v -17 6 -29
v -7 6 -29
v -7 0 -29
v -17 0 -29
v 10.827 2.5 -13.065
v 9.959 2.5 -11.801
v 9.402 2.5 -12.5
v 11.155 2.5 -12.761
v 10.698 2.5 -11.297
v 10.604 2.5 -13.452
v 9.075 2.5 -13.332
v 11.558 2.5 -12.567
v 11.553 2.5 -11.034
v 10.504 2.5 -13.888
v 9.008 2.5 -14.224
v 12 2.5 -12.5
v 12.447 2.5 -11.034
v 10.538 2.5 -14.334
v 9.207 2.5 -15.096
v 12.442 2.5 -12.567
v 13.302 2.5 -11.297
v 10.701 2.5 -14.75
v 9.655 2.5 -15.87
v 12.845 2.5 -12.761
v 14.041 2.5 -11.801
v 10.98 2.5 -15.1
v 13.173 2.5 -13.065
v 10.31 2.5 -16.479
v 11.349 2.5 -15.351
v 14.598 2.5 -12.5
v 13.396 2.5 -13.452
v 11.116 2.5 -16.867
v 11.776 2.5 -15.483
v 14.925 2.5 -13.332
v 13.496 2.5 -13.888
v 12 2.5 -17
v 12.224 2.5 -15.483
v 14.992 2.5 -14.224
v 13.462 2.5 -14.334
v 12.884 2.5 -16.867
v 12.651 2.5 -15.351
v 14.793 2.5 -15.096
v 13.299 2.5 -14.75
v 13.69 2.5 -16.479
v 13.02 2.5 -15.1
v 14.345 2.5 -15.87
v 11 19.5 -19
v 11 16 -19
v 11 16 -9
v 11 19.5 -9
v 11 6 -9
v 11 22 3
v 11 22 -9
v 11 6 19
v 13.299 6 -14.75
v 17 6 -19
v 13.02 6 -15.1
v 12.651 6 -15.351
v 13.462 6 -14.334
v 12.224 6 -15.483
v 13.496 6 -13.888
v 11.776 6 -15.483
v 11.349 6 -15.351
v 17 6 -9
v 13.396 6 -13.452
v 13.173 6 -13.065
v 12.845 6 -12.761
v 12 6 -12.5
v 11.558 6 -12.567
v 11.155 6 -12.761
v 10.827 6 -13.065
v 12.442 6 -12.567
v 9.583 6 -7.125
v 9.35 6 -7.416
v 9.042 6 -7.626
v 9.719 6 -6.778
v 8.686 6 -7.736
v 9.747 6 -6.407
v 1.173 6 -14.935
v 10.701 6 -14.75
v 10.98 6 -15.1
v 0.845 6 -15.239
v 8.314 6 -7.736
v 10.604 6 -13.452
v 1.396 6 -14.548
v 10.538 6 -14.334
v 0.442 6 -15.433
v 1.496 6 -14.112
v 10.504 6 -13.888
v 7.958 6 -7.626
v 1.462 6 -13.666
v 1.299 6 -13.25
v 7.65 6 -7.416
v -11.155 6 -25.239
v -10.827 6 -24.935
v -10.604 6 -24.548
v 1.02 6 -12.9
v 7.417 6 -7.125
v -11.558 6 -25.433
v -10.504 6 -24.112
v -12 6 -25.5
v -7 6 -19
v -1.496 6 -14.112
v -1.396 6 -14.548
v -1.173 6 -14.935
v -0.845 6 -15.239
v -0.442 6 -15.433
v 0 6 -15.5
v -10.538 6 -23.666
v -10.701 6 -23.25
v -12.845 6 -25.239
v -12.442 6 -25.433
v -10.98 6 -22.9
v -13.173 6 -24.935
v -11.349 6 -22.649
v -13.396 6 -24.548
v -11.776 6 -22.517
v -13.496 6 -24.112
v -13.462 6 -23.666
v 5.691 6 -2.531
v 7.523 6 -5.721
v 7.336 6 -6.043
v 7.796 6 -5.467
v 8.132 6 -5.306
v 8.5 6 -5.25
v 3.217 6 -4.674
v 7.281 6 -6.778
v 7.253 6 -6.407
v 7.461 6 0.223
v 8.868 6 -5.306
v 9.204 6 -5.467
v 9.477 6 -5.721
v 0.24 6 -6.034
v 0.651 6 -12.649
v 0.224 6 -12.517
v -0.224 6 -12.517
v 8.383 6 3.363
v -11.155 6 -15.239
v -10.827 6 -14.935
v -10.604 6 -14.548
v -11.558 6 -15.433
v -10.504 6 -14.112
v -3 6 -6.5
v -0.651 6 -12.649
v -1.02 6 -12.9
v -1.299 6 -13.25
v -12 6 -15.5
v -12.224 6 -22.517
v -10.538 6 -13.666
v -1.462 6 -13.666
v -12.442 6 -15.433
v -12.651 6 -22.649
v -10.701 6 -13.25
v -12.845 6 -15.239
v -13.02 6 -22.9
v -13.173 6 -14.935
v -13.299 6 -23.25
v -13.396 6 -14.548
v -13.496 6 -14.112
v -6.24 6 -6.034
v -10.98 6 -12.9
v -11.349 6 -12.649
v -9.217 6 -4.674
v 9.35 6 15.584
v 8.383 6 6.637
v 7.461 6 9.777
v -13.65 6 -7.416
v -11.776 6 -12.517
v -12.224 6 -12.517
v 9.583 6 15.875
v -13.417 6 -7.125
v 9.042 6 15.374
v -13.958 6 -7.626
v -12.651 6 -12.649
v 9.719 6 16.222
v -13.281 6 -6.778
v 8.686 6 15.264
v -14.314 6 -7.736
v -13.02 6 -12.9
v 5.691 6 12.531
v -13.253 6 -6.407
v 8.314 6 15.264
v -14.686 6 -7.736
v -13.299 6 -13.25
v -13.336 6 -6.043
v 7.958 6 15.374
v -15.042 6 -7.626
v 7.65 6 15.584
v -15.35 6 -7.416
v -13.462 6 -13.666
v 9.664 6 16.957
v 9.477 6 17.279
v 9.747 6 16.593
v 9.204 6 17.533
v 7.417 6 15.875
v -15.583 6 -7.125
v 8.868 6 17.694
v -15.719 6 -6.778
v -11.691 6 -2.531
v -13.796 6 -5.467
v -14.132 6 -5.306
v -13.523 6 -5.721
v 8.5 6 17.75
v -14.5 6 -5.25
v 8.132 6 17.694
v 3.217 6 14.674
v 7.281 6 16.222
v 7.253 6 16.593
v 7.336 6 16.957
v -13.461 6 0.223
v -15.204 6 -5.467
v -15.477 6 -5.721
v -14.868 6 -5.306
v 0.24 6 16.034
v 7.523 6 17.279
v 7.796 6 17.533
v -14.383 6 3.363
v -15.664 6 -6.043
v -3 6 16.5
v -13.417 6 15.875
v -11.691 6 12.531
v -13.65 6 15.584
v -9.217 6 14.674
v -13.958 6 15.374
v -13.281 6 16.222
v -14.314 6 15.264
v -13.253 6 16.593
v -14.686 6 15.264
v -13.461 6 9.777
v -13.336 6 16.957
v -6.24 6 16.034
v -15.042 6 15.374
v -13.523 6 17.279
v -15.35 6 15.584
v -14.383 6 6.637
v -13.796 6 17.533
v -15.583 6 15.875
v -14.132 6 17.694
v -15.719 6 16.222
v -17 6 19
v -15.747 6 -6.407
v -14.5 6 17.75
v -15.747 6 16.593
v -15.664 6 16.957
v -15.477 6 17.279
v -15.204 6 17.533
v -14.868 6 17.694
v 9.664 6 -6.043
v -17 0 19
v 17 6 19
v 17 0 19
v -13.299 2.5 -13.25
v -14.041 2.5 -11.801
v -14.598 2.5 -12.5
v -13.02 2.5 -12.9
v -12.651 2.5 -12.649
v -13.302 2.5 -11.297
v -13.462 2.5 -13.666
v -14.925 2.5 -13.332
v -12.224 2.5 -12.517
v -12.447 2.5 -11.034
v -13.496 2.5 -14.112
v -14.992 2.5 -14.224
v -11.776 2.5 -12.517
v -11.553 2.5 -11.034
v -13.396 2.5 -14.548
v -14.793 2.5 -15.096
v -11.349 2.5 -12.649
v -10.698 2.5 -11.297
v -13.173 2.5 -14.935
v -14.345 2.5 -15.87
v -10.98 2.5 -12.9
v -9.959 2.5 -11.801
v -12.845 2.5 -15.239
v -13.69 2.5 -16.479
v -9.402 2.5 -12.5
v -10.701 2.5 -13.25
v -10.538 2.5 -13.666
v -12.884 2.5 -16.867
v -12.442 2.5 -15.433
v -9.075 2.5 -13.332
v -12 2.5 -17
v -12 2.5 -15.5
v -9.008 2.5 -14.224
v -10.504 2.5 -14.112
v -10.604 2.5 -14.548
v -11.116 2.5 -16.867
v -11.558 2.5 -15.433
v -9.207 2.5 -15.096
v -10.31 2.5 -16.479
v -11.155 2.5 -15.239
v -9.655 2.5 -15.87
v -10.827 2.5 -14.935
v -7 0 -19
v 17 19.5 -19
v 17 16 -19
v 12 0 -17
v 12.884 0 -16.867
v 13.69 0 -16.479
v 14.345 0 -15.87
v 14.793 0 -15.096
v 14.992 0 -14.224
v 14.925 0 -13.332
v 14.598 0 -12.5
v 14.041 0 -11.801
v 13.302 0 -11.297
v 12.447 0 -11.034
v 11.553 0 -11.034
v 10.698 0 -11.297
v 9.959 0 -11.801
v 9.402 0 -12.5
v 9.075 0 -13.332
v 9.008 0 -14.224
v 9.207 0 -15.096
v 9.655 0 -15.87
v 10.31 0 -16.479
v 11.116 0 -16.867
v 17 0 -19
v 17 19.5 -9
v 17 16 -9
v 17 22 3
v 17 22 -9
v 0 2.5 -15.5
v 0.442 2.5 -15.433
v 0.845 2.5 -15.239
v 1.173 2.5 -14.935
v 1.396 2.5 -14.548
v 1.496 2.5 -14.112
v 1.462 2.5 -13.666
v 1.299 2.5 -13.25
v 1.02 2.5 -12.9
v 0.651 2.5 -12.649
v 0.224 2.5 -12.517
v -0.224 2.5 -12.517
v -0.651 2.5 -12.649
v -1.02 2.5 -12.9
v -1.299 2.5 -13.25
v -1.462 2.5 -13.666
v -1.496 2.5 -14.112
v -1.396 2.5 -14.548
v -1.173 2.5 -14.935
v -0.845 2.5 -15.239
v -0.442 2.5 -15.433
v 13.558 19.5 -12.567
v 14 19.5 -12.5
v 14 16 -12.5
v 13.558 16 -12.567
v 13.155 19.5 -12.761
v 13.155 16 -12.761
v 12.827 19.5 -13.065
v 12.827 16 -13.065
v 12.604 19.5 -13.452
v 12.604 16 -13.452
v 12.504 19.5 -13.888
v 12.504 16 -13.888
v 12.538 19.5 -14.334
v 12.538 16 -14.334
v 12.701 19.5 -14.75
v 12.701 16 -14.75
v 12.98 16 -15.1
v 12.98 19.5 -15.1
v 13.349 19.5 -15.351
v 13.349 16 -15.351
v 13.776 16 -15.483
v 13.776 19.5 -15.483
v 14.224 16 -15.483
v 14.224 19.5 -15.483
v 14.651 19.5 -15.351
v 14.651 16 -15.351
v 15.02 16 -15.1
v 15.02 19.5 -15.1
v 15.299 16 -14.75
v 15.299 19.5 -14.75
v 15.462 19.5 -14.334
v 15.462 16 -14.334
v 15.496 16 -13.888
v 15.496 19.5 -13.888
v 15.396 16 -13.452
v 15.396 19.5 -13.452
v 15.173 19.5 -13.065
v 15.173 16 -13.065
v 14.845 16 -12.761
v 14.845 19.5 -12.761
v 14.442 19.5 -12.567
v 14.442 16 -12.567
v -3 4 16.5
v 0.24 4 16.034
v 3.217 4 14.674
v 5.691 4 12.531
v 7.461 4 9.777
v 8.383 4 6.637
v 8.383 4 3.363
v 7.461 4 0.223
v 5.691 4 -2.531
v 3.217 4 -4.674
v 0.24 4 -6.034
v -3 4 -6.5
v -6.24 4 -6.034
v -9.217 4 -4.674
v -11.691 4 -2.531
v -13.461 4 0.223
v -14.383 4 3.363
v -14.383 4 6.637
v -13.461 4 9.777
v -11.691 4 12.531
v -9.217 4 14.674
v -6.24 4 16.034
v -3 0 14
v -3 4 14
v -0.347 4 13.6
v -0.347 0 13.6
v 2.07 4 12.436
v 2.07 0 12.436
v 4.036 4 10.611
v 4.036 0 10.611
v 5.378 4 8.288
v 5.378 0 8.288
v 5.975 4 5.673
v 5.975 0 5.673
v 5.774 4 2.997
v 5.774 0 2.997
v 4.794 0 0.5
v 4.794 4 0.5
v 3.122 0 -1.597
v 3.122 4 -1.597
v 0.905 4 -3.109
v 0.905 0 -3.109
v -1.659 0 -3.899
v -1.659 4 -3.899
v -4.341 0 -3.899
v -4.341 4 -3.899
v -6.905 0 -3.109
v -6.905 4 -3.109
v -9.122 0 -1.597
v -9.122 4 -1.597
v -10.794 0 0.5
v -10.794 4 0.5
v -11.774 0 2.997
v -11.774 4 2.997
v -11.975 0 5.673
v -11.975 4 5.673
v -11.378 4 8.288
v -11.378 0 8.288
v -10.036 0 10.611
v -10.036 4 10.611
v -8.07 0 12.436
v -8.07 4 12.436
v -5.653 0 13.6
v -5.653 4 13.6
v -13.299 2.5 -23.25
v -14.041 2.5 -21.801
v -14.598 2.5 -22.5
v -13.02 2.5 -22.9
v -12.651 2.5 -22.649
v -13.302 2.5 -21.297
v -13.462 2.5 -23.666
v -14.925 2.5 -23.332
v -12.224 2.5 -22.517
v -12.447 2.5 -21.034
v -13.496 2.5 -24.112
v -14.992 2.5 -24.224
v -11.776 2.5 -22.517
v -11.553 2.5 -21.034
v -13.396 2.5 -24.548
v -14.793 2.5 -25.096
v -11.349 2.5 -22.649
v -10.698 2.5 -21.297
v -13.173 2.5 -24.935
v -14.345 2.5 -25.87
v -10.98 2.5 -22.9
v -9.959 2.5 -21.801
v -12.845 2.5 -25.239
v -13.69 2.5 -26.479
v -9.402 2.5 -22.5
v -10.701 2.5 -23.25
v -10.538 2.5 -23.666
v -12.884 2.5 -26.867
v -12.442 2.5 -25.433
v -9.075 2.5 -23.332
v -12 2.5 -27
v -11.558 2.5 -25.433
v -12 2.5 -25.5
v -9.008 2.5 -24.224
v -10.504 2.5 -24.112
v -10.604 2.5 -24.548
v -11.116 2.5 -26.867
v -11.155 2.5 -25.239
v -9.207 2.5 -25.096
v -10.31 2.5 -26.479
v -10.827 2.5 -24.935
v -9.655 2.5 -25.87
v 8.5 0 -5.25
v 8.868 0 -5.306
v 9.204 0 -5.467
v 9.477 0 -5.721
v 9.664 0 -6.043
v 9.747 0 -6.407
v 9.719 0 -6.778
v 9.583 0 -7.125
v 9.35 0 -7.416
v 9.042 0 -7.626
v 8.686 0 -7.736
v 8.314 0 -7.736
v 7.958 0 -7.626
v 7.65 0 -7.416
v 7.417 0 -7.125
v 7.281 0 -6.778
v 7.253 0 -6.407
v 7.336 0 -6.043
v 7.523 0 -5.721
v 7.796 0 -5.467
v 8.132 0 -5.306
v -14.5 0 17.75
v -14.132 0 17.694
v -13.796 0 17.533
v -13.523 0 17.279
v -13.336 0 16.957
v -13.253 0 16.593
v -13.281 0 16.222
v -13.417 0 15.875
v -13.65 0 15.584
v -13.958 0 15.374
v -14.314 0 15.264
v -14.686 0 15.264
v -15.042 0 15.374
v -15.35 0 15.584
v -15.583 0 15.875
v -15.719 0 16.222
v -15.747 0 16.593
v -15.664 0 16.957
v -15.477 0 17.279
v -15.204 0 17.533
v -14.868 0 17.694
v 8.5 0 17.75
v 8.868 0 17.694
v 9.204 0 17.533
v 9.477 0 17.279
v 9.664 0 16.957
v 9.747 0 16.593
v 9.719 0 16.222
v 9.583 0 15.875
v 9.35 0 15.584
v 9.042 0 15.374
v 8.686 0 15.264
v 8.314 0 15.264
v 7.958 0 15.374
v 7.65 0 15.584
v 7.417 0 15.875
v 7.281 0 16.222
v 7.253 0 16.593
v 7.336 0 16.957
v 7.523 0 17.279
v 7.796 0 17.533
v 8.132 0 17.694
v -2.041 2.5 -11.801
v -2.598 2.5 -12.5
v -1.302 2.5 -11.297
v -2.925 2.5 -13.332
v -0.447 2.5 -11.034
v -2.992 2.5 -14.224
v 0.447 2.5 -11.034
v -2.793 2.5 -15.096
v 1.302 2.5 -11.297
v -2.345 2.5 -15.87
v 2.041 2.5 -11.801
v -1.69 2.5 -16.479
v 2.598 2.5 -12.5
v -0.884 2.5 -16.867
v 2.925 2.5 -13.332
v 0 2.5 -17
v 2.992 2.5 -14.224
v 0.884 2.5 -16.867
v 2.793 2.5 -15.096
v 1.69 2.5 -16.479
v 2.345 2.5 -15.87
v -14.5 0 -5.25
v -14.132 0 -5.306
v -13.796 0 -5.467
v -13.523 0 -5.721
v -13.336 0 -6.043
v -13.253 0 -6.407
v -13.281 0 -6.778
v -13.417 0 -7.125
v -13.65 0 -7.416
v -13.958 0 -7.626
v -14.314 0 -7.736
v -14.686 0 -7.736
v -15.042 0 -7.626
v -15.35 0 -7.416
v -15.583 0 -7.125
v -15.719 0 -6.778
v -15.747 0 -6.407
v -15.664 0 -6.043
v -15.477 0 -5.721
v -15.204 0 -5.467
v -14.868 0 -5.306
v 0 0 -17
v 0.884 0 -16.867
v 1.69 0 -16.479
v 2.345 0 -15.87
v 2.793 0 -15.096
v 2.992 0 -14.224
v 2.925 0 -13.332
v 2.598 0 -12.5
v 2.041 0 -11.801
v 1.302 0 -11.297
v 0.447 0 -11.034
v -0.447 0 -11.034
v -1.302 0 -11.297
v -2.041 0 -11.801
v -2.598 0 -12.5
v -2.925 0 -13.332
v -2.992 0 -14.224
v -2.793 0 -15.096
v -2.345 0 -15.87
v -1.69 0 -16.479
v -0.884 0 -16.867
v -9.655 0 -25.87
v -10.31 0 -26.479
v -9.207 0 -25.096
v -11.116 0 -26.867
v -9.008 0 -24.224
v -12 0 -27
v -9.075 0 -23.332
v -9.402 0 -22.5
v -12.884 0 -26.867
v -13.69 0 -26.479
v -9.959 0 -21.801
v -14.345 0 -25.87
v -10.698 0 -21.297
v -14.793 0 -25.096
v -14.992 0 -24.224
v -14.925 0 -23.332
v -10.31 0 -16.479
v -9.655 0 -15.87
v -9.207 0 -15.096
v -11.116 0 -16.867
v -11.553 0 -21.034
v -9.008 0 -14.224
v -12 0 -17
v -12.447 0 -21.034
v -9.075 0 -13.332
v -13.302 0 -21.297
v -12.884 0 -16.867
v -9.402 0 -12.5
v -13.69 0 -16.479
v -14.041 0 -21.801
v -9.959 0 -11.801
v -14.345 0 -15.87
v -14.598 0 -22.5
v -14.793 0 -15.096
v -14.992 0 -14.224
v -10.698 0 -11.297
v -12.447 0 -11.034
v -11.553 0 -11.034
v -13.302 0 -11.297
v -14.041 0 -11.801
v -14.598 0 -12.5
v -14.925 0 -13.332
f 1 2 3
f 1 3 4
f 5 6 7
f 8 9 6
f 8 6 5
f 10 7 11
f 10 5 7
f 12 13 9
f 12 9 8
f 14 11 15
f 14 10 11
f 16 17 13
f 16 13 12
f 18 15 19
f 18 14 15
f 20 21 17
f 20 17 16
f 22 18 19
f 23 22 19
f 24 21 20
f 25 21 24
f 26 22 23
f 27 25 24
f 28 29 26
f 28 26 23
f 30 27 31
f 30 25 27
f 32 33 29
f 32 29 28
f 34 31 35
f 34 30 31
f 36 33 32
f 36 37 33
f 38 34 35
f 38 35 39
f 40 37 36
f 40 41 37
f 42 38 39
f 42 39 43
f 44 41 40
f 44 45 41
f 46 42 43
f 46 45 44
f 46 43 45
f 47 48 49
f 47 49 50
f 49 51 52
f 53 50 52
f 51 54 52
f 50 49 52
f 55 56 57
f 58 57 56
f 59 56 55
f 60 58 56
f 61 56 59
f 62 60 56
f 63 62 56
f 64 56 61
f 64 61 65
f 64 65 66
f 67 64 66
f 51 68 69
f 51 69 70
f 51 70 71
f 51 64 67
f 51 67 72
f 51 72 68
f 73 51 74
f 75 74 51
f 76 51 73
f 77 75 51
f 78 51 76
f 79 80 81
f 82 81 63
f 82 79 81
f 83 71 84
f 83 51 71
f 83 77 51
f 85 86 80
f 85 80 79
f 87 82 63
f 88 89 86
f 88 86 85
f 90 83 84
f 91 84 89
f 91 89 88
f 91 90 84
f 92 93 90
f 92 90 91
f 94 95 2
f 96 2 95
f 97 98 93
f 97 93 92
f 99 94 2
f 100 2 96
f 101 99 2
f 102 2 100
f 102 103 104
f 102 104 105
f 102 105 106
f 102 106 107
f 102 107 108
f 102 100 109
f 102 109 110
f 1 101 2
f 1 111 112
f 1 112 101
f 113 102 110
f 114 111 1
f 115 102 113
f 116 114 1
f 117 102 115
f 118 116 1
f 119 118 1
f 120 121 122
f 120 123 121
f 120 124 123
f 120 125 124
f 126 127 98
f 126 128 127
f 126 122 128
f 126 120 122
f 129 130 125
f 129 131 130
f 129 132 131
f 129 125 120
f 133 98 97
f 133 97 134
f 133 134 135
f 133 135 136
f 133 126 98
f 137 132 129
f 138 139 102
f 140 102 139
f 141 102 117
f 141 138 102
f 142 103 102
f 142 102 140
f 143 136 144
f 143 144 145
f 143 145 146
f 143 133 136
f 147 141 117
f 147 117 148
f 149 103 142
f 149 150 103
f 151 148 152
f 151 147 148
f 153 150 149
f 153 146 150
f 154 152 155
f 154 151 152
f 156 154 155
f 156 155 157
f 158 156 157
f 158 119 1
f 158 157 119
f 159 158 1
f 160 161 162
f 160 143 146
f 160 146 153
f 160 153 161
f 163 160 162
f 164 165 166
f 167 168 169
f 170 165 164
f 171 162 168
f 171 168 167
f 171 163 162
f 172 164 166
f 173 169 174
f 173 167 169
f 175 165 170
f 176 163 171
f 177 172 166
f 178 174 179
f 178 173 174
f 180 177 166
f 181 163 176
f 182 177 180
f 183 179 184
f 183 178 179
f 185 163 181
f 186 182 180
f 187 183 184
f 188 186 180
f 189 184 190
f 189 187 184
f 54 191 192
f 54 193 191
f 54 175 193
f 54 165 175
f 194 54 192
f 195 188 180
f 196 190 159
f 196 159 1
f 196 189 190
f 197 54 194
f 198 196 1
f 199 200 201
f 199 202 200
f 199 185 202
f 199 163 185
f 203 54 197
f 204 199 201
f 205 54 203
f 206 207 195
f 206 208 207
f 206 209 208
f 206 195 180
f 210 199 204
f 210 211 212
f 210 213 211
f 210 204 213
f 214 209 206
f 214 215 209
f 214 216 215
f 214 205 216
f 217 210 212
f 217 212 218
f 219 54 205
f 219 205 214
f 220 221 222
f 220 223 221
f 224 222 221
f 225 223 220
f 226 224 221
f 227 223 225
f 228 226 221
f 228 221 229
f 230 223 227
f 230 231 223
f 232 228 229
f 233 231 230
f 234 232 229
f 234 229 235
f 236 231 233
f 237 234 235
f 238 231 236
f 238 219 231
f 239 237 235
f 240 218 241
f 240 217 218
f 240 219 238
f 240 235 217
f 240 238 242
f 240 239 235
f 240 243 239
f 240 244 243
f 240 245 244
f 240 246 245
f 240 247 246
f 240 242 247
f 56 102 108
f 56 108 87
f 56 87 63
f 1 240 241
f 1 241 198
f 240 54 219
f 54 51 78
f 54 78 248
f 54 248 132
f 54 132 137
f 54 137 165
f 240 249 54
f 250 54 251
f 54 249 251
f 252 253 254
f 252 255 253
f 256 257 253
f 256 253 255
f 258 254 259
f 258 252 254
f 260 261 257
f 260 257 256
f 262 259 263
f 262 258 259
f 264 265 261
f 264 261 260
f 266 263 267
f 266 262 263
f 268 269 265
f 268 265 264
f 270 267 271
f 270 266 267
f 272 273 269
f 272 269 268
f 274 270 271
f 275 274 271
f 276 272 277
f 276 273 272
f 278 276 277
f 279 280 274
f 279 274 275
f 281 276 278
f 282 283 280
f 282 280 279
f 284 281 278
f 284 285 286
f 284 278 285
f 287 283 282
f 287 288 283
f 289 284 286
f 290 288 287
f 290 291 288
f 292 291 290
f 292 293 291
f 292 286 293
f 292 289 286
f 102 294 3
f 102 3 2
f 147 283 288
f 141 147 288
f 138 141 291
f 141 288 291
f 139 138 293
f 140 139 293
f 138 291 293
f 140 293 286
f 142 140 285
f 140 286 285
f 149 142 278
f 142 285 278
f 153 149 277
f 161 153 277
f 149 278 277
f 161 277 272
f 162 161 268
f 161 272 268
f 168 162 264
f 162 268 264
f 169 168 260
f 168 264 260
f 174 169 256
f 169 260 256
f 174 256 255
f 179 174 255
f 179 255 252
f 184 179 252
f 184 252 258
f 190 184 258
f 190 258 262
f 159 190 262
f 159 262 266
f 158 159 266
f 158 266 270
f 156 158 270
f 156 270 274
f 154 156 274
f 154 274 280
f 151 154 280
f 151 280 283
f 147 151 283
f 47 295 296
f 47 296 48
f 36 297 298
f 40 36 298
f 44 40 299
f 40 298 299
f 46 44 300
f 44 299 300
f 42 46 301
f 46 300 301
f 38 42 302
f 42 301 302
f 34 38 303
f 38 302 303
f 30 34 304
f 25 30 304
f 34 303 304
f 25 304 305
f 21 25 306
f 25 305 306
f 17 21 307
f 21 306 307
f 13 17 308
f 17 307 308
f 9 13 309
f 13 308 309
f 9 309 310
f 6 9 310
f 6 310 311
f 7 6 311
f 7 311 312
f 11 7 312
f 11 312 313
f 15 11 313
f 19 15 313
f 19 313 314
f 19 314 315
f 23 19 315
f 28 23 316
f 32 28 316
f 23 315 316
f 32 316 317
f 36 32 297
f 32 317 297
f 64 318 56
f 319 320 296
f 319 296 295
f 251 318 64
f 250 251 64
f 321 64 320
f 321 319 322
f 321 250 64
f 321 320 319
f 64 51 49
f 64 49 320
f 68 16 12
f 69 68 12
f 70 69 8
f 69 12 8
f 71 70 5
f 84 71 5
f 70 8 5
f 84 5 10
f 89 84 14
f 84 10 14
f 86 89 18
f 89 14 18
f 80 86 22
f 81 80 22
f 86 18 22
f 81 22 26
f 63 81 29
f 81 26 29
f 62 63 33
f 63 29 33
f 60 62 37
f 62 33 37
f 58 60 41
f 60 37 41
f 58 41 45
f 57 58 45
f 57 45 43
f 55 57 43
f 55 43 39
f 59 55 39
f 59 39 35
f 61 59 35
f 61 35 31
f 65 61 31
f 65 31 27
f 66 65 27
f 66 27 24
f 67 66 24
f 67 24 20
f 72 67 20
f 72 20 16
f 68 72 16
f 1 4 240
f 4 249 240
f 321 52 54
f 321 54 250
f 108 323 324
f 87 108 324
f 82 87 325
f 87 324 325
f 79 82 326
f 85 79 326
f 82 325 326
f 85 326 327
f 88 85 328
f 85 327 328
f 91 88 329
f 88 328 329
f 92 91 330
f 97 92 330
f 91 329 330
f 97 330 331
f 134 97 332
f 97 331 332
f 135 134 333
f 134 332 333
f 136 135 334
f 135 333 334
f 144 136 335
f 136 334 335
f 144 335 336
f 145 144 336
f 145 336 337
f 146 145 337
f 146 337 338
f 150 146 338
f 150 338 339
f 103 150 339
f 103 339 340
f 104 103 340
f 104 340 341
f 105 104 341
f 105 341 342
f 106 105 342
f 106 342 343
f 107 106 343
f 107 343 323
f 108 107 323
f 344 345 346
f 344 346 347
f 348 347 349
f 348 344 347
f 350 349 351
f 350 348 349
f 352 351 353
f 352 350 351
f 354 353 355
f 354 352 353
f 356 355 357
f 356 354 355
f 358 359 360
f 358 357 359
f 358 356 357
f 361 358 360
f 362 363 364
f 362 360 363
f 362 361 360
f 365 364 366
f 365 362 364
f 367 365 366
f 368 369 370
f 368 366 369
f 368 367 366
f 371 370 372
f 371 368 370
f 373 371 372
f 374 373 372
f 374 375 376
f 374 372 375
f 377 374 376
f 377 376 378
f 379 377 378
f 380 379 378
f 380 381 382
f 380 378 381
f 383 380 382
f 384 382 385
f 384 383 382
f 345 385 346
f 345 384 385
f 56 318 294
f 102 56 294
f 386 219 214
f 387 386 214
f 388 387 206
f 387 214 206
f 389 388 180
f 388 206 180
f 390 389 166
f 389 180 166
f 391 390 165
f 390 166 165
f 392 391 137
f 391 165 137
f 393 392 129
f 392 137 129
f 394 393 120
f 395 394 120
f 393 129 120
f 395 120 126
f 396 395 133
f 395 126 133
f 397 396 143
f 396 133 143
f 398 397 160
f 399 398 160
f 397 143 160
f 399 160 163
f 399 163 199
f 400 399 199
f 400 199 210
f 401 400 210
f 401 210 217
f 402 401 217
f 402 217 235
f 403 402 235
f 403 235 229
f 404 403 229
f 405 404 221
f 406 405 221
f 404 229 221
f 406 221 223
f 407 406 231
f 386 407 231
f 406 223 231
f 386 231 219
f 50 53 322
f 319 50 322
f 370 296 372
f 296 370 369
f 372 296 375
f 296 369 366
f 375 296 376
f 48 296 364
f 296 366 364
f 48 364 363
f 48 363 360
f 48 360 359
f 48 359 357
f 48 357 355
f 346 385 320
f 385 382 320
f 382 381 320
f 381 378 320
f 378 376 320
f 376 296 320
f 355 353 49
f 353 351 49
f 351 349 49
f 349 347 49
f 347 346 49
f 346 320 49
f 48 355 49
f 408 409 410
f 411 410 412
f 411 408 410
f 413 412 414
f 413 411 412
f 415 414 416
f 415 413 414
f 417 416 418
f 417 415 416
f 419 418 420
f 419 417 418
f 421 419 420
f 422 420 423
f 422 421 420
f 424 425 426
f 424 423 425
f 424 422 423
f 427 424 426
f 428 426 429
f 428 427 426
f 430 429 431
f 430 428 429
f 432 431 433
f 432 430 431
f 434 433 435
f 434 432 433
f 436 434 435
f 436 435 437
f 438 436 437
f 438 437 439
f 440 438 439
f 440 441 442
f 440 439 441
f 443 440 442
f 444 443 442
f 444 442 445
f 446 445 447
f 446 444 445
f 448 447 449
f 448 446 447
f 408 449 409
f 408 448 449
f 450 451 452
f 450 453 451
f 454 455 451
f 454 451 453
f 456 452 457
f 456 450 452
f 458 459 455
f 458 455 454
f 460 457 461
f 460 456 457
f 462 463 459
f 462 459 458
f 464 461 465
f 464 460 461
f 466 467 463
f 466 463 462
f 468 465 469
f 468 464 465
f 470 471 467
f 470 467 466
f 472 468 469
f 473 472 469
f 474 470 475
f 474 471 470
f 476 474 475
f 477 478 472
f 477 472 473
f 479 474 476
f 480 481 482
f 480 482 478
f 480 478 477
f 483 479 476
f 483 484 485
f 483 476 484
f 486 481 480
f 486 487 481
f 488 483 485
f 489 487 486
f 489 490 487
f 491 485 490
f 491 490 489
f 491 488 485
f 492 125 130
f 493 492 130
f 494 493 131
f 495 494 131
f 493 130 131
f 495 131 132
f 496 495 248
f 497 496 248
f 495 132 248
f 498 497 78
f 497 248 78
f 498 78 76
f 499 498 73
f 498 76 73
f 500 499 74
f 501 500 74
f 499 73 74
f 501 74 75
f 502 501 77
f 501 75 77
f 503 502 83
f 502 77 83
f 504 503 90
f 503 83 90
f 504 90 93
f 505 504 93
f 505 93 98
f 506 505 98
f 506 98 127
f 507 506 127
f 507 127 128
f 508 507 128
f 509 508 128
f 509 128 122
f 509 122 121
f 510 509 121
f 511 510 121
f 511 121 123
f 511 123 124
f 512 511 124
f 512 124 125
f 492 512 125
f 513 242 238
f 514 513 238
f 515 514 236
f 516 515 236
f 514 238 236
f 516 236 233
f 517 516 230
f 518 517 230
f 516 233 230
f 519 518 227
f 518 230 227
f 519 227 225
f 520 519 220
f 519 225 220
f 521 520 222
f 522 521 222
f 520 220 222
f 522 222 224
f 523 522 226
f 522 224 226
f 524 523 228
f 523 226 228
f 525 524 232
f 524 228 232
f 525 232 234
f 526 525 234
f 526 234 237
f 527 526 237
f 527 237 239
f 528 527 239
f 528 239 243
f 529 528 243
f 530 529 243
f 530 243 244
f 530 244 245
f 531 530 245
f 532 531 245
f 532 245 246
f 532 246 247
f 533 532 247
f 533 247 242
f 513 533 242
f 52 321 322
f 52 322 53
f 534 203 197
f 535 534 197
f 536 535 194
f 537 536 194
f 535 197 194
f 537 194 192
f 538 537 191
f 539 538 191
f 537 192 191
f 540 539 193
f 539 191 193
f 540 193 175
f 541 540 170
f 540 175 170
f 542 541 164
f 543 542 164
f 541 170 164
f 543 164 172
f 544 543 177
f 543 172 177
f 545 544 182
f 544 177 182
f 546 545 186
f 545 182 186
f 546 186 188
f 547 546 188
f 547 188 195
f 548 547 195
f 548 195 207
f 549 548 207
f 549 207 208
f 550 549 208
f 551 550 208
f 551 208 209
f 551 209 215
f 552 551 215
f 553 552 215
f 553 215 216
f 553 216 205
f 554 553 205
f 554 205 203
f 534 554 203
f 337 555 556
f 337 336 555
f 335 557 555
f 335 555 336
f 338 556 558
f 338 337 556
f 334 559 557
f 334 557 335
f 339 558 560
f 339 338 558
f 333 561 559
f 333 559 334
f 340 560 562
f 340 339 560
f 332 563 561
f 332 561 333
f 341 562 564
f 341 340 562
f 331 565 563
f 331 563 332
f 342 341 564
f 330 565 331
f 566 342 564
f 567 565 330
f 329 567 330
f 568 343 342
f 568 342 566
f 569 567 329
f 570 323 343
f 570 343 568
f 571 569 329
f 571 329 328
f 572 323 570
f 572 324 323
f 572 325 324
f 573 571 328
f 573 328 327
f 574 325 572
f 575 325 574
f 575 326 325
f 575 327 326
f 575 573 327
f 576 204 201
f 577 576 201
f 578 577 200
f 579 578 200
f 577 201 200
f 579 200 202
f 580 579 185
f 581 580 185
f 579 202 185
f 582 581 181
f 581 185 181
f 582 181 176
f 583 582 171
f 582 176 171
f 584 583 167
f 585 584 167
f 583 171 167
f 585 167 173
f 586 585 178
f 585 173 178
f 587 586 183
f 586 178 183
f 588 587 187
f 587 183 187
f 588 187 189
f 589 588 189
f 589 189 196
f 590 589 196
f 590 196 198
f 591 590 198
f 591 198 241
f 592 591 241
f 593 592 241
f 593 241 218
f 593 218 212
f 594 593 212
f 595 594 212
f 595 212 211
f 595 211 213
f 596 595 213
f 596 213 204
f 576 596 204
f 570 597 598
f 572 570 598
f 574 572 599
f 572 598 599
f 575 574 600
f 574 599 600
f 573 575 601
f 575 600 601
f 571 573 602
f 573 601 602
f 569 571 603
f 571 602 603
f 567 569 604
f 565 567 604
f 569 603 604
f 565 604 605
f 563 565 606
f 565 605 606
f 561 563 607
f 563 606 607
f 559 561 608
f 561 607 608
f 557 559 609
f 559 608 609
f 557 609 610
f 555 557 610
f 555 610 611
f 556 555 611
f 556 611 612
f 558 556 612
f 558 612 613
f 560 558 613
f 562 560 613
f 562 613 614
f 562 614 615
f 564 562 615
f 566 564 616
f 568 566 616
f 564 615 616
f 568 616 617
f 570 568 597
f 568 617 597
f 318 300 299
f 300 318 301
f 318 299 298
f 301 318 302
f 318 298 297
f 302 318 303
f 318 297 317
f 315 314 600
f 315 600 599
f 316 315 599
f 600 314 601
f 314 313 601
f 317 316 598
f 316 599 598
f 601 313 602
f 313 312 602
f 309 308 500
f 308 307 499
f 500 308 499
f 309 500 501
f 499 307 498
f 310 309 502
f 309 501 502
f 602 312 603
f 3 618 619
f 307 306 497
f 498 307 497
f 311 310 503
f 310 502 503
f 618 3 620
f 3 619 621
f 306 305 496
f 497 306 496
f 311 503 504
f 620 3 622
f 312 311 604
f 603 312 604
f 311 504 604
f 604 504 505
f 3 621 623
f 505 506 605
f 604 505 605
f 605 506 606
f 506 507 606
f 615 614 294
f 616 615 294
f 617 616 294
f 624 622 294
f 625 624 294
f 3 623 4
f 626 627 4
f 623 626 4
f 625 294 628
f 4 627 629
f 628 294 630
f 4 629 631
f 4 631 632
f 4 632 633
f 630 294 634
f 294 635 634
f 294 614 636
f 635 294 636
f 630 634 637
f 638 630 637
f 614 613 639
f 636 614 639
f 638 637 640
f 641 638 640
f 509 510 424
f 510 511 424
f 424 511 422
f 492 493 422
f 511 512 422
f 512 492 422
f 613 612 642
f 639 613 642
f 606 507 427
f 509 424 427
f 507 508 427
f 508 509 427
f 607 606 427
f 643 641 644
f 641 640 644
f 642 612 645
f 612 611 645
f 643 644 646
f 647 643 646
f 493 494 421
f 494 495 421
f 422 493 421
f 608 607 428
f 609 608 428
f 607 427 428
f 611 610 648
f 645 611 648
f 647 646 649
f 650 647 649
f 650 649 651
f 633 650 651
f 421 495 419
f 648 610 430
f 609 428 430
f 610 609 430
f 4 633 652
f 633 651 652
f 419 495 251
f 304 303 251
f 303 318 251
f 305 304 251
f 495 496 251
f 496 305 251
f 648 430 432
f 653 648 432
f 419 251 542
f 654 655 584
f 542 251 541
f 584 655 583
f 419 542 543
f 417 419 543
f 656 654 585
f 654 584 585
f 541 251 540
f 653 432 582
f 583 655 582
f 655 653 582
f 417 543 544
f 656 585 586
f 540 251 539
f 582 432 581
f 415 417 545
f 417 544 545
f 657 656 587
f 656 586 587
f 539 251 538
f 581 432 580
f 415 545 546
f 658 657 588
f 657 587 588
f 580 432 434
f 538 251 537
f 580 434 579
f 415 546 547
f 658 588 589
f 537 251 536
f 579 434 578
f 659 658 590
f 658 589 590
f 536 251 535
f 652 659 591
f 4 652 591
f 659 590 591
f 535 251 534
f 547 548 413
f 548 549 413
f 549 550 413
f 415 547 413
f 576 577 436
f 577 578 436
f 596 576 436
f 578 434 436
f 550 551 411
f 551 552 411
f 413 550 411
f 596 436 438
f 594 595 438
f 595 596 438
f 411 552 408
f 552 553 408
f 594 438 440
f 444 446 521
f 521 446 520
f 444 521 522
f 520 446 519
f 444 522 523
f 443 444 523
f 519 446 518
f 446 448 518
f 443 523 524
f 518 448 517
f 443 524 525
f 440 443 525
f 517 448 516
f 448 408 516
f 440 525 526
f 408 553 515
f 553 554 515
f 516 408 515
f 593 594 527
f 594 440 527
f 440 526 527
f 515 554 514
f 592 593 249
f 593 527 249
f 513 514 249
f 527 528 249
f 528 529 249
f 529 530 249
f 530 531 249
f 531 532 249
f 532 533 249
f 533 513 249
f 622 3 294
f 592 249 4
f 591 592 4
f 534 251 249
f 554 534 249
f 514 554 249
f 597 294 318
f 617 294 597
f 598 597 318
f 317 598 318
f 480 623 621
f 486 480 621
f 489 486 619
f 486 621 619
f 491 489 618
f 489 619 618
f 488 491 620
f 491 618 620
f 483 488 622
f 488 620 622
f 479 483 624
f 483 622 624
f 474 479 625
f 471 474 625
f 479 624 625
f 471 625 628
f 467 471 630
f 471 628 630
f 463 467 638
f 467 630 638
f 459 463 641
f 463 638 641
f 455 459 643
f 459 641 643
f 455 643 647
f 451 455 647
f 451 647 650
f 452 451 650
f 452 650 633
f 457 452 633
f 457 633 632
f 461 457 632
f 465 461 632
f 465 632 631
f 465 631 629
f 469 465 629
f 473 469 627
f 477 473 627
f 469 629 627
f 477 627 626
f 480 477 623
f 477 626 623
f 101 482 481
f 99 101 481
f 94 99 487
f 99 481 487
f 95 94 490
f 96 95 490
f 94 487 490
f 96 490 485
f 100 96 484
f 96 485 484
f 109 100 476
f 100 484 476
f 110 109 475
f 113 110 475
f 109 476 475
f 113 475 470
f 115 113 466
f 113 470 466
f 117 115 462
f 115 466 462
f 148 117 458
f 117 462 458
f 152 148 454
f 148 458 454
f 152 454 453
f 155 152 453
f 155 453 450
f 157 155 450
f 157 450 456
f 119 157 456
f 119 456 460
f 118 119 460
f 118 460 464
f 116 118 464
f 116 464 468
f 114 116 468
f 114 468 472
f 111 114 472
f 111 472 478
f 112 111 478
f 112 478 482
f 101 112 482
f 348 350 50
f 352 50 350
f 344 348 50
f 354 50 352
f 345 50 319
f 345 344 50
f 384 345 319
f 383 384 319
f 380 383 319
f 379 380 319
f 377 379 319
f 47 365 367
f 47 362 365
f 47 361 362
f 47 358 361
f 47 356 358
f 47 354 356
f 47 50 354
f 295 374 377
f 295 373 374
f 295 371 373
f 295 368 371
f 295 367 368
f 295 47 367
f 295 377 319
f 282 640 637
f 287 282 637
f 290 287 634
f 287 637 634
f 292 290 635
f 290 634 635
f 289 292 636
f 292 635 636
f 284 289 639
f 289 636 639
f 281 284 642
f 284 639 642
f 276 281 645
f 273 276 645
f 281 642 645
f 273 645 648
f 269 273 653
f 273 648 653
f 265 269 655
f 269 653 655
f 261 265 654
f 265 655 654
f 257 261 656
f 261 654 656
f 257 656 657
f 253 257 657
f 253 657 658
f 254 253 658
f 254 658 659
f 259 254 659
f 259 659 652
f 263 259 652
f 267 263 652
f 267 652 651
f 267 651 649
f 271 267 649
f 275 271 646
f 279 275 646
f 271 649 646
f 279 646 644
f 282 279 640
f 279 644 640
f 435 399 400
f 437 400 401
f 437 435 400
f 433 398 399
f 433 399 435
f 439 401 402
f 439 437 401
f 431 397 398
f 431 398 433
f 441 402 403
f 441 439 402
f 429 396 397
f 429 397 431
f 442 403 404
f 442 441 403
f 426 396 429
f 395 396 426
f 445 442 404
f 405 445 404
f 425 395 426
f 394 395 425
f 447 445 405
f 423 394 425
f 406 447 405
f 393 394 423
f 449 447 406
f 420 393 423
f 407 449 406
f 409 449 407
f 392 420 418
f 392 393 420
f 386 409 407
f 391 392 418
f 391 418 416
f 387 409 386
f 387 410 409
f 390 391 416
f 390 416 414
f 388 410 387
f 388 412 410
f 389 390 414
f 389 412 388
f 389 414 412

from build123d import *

# Parameters (mm, degrees)
SKETCH2_R           = 9
SKETCH2_W           = 6
SKETCH2_H           = 25.976415094
BOSS_EXTRUDE1_DEPTH = 6
SKETCH3_W           = 10
SKETCH3_H           = 6
BOSS_EXTRUDE2_DEPTH = 10
SKETCH4_W           = 6
SKETCH4_H           = 28
BOSS_EXTRUDE3_DEPTH = 16
CHAMFER1_SIZE       = 16
SKETCH5_W           = 6
SKETCH5_H           = 6
BOSS_EXTRUDE4_DEPTH = 10
CUT_EXTRUDE1_REACH  = 42.175
SKETCH7_R           = 1.5
CUT_EXTRUDE2_REACH  = 42.175
SKETCH6_R           = 1.5
SKETCH9_W           = 6
SKETCH9_H           = 10
CUT_EXTRUDE3_DEPTH  = 2.5
SKETCH10_R          = 3
CUT_EXTRUDE4_DEPTH  = 2.5
SKETCH11_R          = 11.5
CUT_EXTRUDE5_DEPTH  = 2
CUT_EXTRUDE6_REACH  = 39.229
SKETCH13_R          = 1.25


with BuildPart() as part:
    # Sketch2 → Boss-Extrude1 (new body)
    # profile 1 of 2: a face of its own
    with BuildSketch(Plane(origin=(0, 0, 0), x_dir=(1, 0, 0), z_dir=(0, 1, 0))):
        Polygon((-17, 19), (-17, -19), (11, -19), (11, 6.976415094), (17, 6.976415094), (17, 19), align=None)
        with Locations(Location((-3, -5, 0), (0, 0, 270))):
            Circle(SKETCH2_R, mode=Mode.SUBTRACT)
    # profile 2 of 2: a face of its own
    with BuildSketch(Plane(origin=(0, 0, 0), x_dir=(1, 0, 0), z_dir=(0, 1, 0))):
        with Locations((14, -6.011792453)):
            Rectangle(SKETCH2_W, SKETCH2_H)
    extrude(amount=BOSS_EXTRUDE1_DEPTH)

    # Sketch3 → Boss-Extrude2 (add)
    with BuildSketch(Plane(origin=(0, 0, -19), x_dir=(-1, 0, 0), z_dir=(0, 0, -1))):
        with Locations((12, 3)):
            Rectangle(SKETCH3_W, SKETCH3_H)
    extrude(amount=BOSS_EXTRUDE2_DEPTH)

    # Sketch4 → Boss-Extrude3 (add)
    with BuildSketch(Plane(origin=(0, 6, 0), x_dir=(1, 0, 0), z_dir=(0, 1, 0))):
        with Locations((14, -5)):
            Rectangle(SKETCH4_W, SKETCH4_H)
    extrude(amount=BOSS_EXTRUDE3_DEPTH)

    # Chamfer1
    chamfer1_edges = [part.edges().sort_by_distance(p)[0] for p in [
        (14, 22, 19),
    ]]
    chamfer(chamfer1_edges, length=CHAMFER1_SIZE)

    # Sketch5 → Boss-Extrude4 (add)
    with BuildSketch(Plane(origin=(0, 0, -9), x_dir=(-1, 0, 0), z_dir=(0, 0, -1))):
        with Locations((-14, 19)):
            Rectangle(SKETCH5_W, SKETCH5_H)
    extrude(amount=BOSS_EXTRUDE4_DEPTH)

    # Sketch7 → Cut-Extrude1 (cut, up to next)
    with BuildSketch(Plane.XZ, mode=Mode.PRIVATE) as cut_extrude1_sk1:
        with Locations(Location((0, -14, 0), (0, 0, 270))):
            Circle(SKETCH7_R)
    cut_extrude1_tool1 = extrude(cut_extrude1_sk1.sketch, amount=-CUT_EXTRUDE1_REACH, mode=Mode.PRIVATE) & part.part
    # Sketch7 → Cut-Extrude1 (cut, up to next)
    with BuildSketch(Plane.XZ, mode=Mode.PRIVATE) as cut_extrude1_sk2:
        with Locations(Location((-12, -14, 0), (0, 0, 270))):
            Circle(SKETCH7_R)
    cut_extrude1_tool2 = extrude(cut_extrude1_sk2.sketch, amount=-CUT_EXTRUDE1_REACH, mode=Mode.PRIVATE) & part.part
    # Sketch7 → Cut-Extrude1 (cut, up to next)
    with BuildSketch(Plane.XZ, mode=Mode.PRIVATE) as cut_extrude1_sk3:
        with Locations(Location((-12, -24, 0), (0, 0, 270))):
            Circle(SKETCH7_R)
    cut_extrude1_tool3 = extrude(cut_extrude1_sk3.sketch, amount=-CUT_EXTRUDE1_REACH, mode=Mode.PRIVATE) & part.part
    # Sketch7 → Cut-Extrude1 (cut, up to next)
    with BuildSketch(Plane.XZ, mode=Mode.PRIVATE) as cut_extrude1_sk4:
        with Locations(Location((12, -14, 0), (0, 0, 90))):
            Circle(SKETCH7_R)
    cut_extrude1_tool4 = extrude(cut_extrude1_sk4.sketch, amount=-CUT_EXTRUDE1_REACH, mode=Mode.PRIVATE) & part.part
    add(cut_extrude1_tool1.solids().sort_by_distance((0, 0, -14))[0], mode=Mode.SUBTRACT)
    add(cut_extrude1_tool2.solids().sort_by_distance((-12, 0, -14))[0], mode=Mode.SUBTRACT)
    add(cut_extrude1_tool3.solids().sort_by_distance((-12, 0, -24))[0], mode=Mode.SUBTRACT)
    add(cut_extrude1_tool4.solids().sort_by_distance((12, 0, -14))[0], mode=Mode.SUBTRACT)

    # Sketch6 → Cut-Extrude2 (cut, up to next)
    with BuildSketch(Plane.XZ.offset(-22), mode=Mode.PRIVATE) as cut_extrude2_sk1:
        with Locations(Location((14, -14, 0), (0, 0, 90))):
            Circle(SKETCH6_R)
    cut_extrude2_tool1 = extrude(cut_extrude2_sk1.sketch, amount=CUT_EXTRUDE2_REACH, mode=Mode.PRIVATE) & part.part
    add(cut_extrude2_tool1.solids().sort_by_distance((14, 22, -14))[0], mode=Mode.SUBTRACT)

    # Sketch9 → Cut-Extrude3 (cut)
    with BuildSketch(Plane(origin=(0, 22, 0), x_dir=(1, 0, 0), z_dir=(0, 1, 0))):
        with Locations((14, 14)):
            Rectangle(SKETCH9_W, SKETCH9_H)
    extrude(amount=-CUT_EXTRUDE3_DEPTH, mode=Mode.SUBTRACT)

    # Sketch10 → Cut-Extrude4 (cut)
    with BuildSketch(Plane.XZ):
        with Locations(Location((12, -14, 0), (0, 0, 270))):
            Circle(SKETCH10_R)
        with Locations(Location((0, -14, 0), (0, 0, 270))):
            Circle(SKETCH10_R)
        with Locations(Location((-12, -14, 0), (0, 0, 270))):
            Circle(SKETCH10_R)
        with Locations(Location((-12, -24, 0), (0, 0, 270))):
            Circle(SKETCH10_R)
    extrude(amount=-CUT_EXTRUDE4_DEPTH, mode=Mode.SUBTRACT)

    # Sketch11 → Cut-Extrude5 (cut)
    with BuildSketch(Plane(origin=(0, 6, 0), x_dir=(1, 0, 0), z_dir=(0, 1, 0))):
        with Locations(Location((-3, -5, 0), (0, 0, 270))):
            Circle(SKETCH11_R)
    extrude(amount=-CUT_EXTRUDE5_DEPTH, mode=Mode.SUBTRACT)

    # Sketch13 → Cut-Extrude6 (cut, up to next)
    with BuildSketch(Plane(origin=(0, 6, 0), x_dir=(1, 0, 0), z_dir=(0, 1, 0)), mode=Mode.PRIVATE) as cut_extrude6_sk1:
        with Locations(Location((-14.5, 6.5, 0), (0, 0, 270))):
            Circle(SKETCH13_R)
    cut_extrude6_tool1 = extrude(cut_extrude6_sk1.sketch, amount=-CUT_EXTRUDE6_REACH, mode=Mode.PRIVATE) & part.part
    # Sketch13 → Cut-Extrude6 (cut, up to next)
    with BuildSketch(Plane(origin=(0, 6, 0), x_dir=(1, 0, 0), z_dir=(0, 1, 0)), mode=Mode.PRIVATE) as cut_extrude6_sk2:
        with Locations(Location((8.5, 6.5, 0), (0, 0, 270))):
            Circle(SKETCH13_R)
    cut_extrude6_tool2 = extrude(cut_extrude6_sk2.sketch, amount=-CUT_EXTRUDE6_REACH, mode=Mode.PRIVATE) & part.part
    # Sketch13 → Cut-Extrude6 (cut, up to next)
    with BuildSketch(Plane(origin=(0, 6, 0), x_dir=(1, 0, 0), z_dir=(0, 1, 0)), mode=Mode.PRIVATE) as cut_extrude6_sk3:
        with Locations(Location((8.5, -16.5, 0), (0, 0, 270))):
            Circle(SKETCH13_R)
    cut_extrude6_tool3 = extrude(cut_extrude6_sk3.sketch, amount=-CUT_EXTRUDE6_REACH, mode=Mode.PRIVATE) & part.part
    # Sketch13 → Cut-Extrude6 (cut, up to next)
    with BuildSketch(Plane(origin=(0, 6, 0), x_dir=(1, 0, 0), z_dir=(0, 1, 0)), mode=Mode.PRIVATE) as cut_extrude6_sk4:
        with Locations(Location((-14.5, -16.5, 0), (0, 0, 270))):
            Circle(SKETCH13_R)
    cut_extrude6_tool4 = extrude(cut_extrude6_sk4.sketch, amount=-CUT_EXTRUDE6_REACH, mode=Mode.PRIVATE) & part.part
    add(cut_extrude6_tool1.solids().sort_by_distance((-14.5, 6, -6.5))[0], mode=Mode.SUBTRACT)
    add(cut_extrude6_tool2.solids().sort_by_distance((8.5, 6, -6.5))[0], mode=Mode.SUBTRACT)
    add(cut_extrude6_tool3.solids().sort_by_distance((8.5, 6, 16.5))[0], mode=Mode.SUBTRACT)
    add(cut_extrude6_tool4.solids().sort_by_distance((-14.5, 6, 16.5))[0], mode=Mode.SUBTRACT)


solid = part.part
